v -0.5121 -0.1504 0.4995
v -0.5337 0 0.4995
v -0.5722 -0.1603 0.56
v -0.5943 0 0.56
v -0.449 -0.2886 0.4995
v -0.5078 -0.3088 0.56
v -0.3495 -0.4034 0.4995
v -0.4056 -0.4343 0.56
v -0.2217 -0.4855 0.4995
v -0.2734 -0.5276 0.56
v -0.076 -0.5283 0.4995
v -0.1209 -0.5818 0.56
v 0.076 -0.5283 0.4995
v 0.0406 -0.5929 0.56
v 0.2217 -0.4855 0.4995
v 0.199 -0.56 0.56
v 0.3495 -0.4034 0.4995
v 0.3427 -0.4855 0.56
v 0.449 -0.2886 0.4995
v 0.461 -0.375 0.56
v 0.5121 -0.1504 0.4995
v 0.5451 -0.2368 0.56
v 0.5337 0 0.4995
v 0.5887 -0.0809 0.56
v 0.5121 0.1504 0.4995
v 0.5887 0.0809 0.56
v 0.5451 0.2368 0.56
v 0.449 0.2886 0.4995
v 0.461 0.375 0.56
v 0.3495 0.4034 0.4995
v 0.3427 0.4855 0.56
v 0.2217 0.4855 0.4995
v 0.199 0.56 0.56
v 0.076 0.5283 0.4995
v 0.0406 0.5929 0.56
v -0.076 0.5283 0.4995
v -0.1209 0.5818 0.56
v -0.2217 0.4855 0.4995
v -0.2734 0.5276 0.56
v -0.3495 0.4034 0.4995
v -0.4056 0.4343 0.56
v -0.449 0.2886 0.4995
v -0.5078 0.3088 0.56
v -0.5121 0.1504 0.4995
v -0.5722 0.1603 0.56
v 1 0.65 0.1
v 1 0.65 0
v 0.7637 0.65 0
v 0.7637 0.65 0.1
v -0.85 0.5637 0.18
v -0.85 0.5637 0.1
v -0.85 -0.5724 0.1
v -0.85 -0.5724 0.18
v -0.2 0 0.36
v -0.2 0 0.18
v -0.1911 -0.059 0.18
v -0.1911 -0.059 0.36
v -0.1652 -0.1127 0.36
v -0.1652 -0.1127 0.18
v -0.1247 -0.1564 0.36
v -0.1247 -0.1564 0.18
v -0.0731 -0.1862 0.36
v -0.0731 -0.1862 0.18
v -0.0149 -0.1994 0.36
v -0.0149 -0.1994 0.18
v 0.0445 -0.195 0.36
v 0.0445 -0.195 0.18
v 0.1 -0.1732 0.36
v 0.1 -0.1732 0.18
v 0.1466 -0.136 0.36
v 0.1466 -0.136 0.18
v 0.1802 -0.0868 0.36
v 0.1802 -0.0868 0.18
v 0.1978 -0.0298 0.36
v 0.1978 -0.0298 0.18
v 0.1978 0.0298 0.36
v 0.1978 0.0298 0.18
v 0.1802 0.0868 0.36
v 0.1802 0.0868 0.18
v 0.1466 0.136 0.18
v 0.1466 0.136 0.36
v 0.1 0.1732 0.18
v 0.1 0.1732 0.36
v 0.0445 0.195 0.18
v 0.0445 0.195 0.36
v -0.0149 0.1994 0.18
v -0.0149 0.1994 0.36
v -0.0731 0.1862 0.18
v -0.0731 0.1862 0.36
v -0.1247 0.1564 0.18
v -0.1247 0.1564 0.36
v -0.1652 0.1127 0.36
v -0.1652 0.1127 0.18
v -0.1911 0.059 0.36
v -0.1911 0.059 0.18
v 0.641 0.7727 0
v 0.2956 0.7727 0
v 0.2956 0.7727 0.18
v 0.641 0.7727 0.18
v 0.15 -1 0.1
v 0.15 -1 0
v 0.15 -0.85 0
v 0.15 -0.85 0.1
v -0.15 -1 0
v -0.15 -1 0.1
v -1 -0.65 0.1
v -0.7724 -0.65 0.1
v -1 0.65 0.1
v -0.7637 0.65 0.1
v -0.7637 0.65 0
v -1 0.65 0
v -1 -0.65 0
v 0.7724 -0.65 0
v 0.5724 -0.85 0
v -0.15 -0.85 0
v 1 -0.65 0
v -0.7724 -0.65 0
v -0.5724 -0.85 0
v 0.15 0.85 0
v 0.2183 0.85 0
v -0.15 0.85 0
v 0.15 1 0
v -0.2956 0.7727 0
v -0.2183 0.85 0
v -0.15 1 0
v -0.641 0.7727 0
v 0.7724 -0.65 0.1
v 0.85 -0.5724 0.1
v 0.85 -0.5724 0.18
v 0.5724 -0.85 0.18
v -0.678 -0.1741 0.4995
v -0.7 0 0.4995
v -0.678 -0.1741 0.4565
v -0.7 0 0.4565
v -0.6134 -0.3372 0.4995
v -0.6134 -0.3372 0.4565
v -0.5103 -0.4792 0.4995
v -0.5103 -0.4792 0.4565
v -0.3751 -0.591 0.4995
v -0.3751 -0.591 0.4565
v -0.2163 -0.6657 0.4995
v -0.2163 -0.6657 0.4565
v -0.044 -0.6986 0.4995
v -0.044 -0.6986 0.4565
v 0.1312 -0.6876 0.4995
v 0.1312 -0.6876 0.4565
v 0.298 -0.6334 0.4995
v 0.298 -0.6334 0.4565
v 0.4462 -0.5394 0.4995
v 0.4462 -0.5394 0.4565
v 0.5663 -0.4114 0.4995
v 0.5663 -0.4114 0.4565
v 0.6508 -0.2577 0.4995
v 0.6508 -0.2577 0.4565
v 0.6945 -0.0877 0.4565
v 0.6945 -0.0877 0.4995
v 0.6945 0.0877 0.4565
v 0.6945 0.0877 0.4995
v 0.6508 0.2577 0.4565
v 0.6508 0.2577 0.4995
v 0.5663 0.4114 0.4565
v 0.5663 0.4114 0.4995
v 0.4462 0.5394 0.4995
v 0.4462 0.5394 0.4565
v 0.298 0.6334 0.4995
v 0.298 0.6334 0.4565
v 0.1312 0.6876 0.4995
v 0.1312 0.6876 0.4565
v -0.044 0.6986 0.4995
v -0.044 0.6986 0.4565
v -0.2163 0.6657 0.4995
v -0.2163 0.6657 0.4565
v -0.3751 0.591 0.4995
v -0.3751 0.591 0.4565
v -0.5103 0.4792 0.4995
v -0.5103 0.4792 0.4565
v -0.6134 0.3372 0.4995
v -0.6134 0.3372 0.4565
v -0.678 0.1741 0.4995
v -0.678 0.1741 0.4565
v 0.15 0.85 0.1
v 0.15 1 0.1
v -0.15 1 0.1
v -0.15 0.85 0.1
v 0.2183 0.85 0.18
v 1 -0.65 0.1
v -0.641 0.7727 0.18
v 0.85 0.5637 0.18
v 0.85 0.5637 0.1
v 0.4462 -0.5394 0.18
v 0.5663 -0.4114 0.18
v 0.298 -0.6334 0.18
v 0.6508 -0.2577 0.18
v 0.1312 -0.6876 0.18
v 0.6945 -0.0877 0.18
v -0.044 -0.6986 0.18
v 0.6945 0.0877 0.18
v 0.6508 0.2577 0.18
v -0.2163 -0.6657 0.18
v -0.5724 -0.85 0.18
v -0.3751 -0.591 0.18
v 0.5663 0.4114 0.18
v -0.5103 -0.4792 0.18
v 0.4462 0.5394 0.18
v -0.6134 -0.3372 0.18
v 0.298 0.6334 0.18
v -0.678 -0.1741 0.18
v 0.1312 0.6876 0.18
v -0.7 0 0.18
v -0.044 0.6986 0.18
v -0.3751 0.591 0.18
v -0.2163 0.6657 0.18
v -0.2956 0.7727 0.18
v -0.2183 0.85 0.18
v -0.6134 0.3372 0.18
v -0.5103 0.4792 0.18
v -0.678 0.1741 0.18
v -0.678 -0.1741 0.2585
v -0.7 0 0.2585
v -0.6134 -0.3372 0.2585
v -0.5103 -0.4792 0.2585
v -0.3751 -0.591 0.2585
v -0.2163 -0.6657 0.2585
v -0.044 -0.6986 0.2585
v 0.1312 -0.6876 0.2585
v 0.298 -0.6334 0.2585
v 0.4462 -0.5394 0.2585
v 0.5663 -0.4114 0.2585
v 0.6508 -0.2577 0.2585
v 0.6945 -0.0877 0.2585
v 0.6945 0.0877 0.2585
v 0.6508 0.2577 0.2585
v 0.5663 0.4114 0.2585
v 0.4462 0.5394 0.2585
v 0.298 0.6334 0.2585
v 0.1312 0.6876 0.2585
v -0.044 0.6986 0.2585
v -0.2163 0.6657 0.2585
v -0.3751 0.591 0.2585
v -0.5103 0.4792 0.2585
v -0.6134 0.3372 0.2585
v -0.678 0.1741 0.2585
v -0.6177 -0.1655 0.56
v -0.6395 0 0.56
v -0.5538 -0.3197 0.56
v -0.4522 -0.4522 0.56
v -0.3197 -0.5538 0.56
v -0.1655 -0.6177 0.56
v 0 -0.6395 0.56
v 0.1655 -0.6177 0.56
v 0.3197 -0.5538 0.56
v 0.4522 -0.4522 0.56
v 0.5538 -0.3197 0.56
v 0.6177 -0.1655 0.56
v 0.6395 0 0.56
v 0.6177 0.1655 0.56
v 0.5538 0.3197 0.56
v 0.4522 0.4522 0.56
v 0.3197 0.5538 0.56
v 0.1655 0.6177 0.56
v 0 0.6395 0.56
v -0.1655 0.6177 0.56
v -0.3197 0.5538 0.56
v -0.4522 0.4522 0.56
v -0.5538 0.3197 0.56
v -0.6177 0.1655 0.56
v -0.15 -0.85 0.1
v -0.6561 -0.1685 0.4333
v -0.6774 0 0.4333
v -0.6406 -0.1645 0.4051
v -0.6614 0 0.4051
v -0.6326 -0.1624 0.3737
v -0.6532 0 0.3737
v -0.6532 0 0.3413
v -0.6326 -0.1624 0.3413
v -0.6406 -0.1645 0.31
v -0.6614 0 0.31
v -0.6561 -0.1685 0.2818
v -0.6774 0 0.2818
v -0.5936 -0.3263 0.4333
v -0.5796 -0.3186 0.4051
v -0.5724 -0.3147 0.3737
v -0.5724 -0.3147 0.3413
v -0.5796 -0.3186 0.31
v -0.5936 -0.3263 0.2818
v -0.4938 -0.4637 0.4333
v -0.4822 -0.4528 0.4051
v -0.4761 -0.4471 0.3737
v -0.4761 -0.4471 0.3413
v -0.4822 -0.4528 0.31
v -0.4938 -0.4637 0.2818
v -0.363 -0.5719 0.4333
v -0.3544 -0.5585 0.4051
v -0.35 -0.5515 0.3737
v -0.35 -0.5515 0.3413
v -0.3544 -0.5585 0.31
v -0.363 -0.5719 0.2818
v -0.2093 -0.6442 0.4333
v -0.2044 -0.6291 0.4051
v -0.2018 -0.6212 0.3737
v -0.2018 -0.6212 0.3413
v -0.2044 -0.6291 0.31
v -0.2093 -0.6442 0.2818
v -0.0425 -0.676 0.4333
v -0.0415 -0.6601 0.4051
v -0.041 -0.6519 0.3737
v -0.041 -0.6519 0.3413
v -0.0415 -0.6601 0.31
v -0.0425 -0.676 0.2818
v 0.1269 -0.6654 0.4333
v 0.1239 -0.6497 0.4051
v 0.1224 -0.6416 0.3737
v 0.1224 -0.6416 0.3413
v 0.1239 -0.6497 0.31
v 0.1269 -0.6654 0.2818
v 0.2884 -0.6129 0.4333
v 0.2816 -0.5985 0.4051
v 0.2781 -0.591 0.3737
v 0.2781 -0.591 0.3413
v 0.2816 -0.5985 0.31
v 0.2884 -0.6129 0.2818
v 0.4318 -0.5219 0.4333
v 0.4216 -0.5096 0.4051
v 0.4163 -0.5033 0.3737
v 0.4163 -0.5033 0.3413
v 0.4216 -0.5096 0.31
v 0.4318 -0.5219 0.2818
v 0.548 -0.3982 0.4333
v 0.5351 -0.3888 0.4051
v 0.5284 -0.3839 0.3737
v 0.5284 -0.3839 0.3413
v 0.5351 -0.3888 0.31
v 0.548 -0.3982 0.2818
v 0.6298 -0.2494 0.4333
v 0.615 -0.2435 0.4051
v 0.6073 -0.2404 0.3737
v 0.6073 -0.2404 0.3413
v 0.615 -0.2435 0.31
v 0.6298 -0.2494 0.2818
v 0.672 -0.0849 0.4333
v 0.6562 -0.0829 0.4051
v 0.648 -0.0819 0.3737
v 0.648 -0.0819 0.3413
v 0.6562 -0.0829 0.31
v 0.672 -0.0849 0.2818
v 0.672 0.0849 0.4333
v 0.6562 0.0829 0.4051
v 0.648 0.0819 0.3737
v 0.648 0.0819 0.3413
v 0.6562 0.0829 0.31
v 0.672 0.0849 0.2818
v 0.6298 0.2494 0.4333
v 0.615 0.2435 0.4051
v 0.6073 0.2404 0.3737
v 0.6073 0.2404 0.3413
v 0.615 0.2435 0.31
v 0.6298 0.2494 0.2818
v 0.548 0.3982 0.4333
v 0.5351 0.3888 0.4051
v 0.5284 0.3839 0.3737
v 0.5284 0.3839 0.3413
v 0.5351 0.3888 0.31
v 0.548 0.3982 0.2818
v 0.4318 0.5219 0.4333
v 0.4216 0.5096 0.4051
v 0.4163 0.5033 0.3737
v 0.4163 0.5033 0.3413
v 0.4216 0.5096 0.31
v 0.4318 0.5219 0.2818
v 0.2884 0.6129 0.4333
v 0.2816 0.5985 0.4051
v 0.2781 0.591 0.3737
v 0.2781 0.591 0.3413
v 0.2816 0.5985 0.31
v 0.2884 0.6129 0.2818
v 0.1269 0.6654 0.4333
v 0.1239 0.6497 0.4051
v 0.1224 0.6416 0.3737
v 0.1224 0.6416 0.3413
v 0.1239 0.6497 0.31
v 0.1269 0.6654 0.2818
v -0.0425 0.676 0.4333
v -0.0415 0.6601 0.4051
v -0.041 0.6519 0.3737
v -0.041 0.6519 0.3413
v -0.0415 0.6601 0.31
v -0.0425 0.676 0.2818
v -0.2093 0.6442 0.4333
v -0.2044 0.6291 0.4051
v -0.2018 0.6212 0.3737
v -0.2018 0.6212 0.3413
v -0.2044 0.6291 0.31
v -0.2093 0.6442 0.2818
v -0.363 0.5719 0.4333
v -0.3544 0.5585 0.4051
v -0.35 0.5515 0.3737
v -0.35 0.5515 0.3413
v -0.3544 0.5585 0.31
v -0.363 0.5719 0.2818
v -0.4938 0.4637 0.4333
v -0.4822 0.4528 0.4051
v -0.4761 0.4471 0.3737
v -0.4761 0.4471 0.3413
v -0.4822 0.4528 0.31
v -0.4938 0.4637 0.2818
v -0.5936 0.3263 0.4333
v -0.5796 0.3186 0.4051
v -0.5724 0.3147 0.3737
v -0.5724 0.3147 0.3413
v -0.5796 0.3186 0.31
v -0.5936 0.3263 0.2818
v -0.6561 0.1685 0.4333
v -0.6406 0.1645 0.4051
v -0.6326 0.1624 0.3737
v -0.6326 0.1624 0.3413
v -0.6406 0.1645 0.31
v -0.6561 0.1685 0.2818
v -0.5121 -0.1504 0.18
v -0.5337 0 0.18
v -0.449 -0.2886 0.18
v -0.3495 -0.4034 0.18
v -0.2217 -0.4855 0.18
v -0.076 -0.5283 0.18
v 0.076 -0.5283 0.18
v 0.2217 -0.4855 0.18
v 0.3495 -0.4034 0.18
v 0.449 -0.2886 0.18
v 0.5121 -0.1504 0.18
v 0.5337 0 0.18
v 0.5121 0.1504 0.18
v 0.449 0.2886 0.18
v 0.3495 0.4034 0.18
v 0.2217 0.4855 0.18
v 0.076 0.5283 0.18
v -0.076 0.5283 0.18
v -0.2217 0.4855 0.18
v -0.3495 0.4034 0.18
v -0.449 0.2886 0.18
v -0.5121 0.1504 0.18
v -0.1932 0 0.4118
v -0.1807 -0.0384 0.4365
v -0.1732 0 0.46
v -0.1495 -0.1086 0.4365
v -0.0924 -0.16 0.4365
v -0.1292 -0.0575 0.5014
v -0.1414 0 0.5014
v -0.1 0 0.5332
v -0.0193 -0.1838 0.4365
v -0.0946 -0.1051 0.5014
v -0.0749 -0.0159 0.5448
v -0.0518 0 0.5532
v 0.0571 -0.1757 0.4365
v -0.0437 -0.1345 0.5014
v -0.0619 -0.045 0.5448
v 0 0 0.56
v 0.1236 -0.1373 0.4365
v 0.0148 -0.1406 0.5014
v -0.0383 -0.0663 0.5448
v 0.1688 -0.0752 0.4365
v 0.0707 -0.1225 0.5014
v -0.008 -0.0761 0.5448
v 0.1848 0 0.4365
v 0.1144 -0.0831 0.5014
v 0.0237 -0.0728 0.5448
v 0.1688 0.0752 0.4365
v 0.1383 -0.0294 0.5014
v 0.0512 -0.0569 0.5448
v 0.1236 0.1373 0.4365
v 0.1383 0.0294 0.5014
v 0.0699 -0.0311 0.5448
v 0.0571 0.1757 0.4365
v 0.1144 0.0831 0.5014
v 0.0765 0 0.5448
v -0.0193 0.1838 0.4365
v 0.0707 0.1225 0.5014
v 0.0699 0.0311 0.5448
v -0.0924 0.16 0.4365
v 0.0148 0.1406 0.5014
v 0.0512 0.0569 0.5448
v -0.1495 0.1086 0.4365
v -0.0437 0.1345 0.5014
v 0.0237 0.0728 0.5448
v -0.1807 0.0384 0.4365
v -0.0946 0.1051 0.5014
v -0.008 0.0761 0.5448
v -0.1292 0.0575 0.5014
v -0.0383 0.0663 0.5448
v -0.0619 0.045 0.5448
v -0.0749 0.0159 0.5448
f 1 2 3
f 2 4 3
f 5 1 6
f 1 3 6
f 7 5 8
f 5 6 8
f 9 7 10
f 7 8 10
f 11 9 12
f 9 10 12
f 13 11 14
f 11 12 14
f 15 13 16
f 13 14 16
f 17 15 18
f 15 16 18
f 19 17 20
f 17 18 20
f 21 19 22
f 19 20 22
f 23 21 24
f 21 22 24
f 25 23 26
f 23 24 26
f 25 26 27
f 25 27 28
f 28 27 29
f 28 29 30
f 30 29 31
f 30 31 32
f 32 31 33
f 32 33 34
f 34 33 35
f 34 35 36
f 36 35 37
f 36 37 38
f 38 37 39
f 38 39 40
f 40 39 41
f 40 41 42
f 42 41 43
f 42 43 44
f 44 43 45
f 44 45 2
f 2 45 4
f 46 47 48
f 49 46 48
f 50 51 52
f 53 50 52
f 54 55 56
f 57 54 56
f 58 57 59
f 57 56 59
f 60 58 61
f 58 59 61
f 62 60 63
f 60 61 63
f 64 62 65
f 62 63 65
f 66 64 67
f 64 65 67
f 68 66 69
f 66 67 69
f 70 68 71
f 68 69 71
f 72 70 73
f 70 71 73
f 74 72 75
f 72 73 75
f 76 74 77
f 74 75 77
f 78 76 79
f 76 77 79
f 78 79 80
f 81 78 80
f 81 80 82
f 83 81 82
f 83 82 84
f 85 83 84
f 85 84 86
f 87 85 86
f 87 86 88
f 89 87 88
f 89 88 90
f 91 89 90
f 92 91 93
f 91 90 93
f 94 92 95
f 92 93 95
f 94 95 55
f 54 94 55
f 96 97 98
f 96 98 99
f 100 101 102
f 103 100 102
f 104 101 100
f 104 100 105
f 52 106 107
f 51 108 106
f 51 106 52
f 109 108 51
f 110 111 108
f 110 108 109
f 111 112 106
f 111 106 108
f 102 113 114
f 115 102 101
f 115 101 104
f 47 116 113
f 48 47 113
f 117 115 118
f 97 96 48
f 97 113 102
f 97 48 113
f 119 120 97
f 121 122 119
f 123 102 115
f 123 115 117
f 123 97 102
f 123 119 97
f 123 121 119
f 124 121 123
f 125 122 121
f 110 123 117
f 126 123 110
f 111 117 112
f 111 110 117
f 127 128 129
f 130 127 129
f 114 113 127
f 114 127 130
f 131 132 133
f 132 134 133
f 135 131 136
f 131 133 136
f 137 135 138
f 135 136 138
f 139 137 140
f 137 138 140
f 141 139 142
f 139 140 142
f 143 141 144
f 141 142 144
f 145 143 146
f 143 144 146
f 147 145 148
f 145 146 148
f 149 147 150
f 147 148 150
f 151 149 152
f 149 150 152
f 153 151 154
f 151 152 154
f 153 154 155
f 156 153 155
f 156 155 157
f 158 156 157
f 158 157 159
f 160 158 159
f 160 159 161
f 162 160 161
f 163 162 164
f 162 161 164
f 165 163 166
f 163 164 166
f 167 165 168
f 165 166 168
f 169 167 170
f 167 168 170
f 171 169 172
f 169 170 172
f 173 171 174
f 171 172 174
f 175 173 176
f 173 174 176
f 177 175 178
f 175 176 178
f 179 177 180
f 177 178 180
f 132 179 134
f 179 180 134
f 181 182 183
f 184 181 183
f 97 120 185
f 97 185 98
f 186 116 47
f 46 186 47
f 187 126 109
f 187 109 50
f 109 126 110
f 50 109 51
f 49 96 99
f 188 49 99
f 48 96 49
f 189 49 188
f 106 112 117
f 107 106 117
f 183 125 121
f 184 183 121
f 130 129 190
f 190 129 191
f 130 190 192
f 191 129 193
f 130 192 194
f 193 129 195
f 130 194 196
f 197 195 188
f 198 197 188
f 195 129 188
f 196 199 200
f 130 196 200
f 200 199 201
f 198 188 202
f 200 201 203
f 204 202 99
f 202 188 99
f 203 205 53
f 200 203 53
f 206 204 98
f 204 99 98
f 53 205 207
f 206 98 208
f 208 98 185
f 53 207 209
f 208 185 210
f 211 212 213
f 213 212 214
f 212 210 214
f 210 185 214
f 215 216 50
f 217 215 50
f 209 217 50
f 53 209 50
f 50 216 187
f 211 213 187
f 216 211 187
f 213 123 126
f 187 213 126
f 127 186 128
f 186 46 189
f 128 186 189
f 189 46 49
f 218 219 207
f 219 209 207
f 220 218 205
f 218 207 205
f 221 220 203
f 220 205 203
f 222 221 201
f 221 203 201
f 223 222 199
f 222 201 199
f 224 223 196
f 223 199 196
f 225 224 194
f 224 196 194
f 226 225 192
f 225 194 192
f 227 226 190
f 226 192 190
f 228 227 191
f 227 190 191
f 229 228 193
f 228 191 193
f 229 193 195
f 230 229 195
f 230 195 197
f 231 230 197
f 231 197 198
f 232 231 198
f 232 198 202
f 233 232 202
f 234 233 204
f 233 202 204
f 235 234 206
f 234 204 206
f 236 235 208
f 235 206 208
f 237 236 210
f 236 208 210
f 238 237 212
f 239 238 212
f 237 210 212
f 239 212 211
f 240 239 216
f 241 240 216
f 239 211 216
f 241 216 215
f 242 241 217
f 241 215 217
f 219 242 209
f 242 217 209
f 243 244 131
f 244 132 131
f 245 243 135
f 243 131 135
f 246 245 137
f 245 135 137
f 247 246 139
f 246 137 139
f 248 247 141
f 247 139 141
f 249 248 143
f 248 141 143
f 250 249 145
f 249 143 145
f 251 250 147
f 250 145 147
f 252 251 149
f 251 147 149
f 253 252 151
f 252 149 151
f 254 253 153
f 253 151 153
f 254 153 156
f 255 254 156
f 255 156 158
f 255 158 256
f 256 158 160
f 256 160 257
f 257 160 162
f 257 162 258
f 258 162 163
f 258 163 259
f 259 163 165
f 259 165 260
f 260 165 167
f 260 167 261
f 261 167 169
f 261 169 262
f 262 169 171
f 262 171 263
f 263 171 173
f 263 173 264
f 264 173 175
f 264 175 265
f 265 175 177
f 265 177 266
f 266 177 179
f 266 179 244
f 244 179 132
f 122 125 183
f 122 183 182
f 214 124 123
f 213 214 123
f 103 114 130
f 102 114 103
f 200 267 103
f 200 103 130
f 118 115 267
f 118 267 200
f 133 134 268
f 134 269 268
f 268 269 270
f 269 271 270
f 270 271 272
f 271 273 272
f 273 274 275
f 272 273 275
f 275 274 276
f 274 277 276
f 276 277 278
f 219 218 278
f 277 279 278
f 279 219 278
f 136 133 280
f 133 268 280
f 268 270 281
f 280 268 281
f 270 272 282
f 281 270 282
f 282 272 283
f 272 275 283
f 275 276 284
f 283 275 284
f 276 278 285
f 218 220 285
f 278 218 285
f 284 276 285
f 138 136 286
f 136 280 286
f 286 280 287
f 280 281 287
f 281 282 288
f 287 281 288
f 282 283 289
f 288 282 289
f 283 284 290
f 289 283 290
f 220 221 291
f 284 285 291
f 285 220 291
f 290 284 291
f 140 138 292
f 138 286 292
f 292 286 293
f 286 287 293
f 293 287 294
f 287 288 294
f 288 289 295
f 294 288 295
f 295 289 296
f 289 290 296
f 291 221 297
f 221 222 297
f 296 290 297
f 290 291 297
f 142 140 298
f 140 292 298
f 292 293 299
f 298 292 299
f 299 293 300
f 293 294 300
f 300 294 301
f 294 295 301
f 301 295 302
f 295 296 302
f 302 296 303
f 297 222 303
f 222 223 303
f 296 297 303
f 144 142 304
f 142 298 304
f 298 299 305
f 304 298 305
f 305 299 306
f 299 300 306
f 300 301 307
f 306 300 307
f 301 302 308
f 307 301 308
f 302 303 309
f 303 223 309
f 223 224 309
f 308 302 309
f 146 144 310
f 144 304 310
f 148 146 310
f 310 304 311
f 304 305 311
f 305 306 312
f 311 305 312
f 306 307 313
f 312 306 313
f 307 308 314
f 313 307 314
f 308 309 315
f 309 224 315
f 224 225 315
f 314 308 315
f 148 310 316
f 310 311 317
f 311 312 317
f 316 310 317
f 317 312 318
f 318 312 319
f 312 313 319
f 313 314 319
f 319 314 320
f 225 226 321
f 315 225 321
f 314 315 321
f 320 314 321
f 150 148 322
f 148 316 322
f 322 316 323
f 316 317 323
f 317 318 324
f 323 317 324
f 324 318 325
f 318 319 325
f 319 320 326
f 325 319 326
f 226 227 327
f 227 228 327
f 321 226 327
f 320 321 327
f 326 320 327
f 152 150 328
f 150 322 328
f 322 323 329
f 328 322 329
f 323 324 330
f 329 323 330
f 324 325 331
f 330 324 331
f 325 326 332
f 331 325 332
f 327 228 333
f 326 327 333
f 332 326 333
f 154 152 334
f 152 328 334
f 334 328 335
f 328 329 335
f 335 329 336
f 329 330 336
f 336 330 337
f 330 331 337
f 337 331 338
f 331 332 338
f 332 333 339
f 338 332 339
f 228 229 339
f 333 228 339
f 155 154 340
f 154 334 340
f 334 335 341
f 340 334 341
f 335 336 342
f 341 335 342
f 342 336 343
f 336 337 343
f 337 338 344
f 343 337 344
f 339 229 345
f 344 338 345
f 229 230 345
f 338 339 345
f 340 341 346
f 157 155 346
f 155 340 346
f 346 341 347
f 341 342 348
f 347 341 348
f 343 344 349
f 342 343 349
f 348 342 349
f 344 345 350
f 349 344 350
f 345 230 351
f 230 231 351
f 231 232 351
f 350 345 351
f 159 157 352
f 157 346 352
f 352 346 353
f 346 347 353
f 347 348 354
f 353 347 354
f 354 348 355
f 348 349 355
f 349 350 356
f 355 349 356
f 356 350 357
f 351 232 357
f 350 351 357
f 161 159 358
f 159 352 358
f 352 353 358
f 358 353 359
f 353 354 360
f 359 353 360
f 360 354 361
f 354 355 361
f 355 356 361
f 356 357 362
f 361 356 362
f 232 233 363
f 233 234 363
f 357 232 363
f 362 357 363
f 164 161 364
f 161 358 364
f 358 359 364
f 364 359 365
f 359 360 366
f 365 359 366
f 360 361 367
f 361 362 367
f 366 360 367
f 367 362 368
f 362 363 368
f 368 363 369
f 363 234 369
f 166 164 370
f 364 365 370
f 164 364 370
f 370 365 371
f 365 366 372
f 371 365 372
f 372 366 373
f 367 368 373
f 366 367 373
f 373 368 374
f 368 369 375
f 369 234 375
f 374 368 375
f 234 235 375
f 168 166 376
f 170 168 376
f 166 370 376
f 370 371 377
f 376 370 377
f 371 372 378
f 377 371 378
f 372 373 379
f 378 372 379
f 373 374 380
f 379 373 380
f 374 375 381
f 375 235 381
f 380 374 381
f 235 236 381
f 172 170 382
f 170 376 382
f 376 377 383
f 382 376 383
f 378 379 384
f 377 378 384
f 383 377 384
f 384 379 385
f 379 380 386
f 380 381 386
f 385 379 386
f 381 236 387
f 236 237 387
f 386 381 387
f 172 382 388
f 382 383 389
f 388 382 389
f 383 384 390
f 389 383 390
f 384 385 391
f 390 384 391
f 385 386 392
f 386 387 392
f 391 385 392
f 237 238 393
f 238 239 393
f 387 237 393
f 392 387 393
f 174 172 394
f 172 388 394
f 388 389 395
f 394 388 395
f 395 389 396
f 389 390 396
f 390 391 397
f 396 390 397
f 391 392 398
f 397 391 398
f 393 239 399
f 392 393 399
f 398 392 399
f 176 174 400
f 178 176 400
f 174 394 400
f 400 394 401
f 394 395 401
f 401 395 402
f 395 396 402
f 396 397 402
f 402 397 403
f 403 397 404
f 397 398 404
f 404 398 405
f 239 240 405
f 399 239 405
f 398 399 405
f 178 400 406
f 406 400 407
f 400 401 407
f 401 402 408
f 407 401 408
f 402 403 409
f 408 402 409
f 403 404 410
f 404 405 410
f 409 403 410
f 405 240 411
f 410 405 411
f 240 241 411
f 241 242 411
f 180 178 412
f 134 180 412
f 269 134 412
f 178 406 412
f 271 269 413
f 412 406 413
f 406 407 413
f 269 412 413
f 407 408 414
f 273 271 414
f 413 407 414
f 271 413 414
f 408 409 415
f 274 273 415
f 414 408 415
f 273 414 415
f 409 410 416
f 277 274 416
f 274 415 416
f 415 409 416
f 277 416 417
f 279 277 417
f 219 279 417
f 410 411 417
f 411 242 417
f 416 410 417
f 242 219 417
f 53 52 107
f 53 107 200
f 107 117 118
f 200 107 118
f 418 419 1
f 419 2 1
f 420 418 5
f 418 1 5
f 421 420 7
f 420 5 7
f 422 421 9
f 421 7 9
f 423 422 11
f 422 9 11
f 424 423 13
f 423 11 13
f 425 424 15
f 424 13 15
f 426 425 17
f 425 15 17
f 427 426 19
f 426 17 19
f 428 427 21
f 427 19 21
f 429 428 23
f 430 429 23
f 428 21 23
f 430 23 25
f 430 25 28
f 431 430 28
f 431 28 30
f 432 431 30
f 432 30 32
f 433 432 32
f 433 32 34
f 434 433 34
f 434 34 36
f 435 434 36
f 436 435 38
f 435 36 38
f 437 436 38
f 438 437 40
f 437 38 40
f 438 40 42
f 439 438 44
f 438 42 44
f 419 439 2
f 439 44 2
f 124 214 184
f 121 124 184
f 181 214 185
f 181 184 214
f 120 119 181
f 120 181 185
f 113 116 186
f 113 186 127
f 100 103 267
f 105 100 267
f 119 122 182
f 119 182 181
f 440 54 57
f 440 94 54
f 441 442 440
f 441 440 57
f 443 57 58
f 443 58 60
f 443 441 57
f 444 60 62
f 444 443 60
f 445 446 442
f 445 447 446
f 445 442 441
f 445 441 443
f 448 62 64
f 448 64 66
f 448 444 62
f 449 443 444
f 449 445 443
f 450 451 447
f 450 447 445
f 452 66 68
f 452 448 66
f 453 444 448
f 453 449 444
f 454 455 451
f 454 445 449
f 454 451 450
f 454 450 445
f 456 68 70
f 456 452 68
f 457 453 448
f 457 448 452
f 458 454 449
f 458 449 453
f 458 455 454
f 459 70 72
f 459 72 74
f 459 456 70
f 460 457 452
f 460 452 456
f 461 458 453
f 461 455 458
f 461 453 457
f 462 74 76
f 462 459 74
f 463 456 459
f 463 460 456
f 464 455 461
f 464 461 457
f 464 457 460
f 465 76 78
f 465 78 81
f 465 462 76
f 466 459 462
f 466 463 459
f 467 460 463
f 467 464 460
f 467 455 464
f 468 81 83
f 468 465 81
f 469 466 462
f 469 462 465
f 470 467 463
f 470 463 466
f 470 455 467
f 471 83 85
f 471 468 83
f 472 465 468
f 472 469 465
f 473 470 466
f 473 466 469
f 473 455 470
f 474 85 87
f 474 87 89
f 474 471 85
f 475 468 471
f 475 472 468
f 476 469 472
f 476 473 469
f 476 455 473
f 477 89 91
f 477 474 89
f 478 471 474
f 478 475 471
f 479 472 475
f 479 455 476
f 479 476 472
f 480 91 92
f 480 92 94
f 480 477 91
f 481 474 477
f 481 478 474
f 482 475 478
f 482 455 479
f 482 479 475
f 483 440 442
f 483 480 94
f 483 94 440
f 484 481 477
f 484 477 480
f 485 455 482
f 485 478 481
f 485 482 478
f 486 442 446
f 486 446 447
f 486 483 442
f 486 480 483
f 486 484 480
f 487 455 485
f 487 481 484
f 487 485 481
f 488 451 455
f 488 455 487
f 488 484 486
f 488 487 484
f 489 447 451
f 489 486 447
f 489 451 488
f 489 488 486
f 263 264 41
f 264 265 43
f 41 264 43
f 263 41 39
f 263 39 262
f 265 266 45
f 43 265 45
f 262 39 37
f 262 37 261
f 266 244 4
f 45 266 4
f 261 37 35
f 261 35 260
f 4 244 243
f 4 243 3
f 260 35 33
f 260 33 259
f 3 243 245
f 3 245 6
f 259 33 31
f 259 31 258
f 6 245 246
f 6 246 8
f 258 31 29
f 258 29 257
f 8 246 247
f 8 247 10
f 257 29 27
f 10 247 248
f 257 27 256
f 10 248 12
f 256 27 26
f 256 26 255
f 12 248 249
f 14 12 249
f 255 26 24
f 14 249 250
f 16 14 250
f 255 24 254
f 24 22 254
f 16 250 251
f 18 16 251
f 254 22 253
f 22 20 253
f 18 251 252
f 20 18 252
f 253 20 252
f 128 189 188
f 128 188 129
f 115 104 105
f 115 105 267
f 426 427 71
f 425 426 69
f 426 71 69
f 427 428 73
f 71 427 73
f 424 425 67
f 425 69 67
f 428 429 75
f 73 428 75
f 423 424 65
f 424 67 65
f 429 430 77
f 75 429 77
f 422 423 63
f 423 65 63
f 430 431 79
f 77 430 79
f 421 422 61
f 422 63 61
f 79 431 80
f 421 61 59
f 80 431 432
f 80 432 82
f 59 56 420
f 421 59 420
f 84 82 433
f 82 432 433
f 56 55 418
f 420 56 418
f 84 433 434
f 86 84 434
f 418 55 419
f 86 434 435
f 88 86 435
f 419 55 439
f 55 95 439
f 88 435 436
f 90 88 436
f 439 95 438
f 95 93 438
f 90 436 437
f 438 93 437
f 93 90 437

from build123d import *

# Parameters (mm, degrees)
BOSS_EXTRUDE1_DEPTH   = 0.1
SKETCH1_W             = 0.15
SKETCH1_H             = 0.3
BOSS_EXTRUDE1_2_DEPTH = 0.1
SKETCH1_W_2           = 0.3
SKETCH1_H_2           = 1.3
BOSS_EXTRUDE1_3_DEPTH = 0.1
BOSS_EXTRUDE2_DEPTH   = 0.18
SKETCH3_W             = 0.2
SKETCH3_H             = 0.38
FILLET1_R             = 0.2


with BuildPart() as part:
    # Sketch1 → Boss-Extrude1 (new body)
    with BuildSketch(Plane.XY):
        with BuildLine():
            Line((0, 1), (-0.15, 1))
            Line((-0.15, 1), (-0.15, 0.46269883))
            Line((-0.15, 0.46269883), (-0.075, 0.46269883))
            Line((-0.075, 0.46269883), (-0.075, 0.195574953))
            ThreePointArc((-0.075, 0.195574953), (-0.205961394, -0.038137467), (0, -0.209462556))
            Line((0, -0.209462556), (0, 1))
        make_face()
    boss_extrude1 = extrude(amount=BOSS_EXTRUDE1_DEPTH)



with BuildPart() as body_2:
    # Sketch1 → Boss-Extrude1 2 (new body)
    with BuildSketch(Plane.XY):
        with Locations((-0.075, -0.85)):
            Rectangle(SKETCH1_W, SKETCH1_H)
    boss_extrude1_2 = extrude(amount=BOSS_EXTRUDE1_2_DEPTH)


with BuildPart() as body_3:
    # Sketch1 → Boss-Extrude1 3 (new body)
    with BuildSketch(Plane.XY):
        with Locations((-0.85, 0)):
            Rectangle(SKETCH1_W_2, SKETCH1_H_2)
    boss_extrude1_3 = extrude(amount=BOSS_EXTRUDE1_3_DEPTH)


with BuildPart() as part_1:
    add(part.part)

    add(body_2.part)  # Boss-Extrude2 merges body 2

    add(body_3.part)  # Boss-Extrude2 merges body 3
    # Sketch2 → Boss-Extrude2 (add)
    with BuildSketch(Plane.XY):
        Polygon((0, -0.85), (0, 0.85), (-0.218303033, 0.85), (-0.295625525, 0.772677507), (-0.641012319, 0.772677507), (-0.85, 0.563689826), (-0.85, -0.572384616), (-0.572384616, -0.85), align=None)
    boss_extrude2 = extrude(amount=BOSS_EXTRUDE2_DEPTH)

    # Mirror2: Boss-Extrude1, Boss-Extrude1 2, Boss-Extrude1 3, Boss-Extrude2 across plane
    add(boss_extrude1.mirror(Plane(origin=(0, 0, 0), x_dir=(0, 0, 1), z_dir=(1, 0, 0))))
    add(boss_extrude1_2.mirror(Plane(origin=(0, 0, 0), x_dir=(0, 0, 1), z_dir=(1, 0, 0))))
    add(boss_extrude1_3.mirror(Plane(origin=(0, 0, 0), x_dir=(0, 0, 1), z_dir=(1, 0, 0))))
    add(boss_extrude2.mirror(Plane(origin=(0, 0, 0), x_dir=(0, 0, 1), z_dir=(1, 0, 0))))

    # Sketch3 → Revolve1 (revolve)
    with BuildSketch(Plane(origin=(0, 0, 0), x_dir=(1, 0, 0), z_dir=(0, 1, 0)), mode=Mode.PRIVATE) as revolve1_sk:
        with Locations((0.1, -0.37)):
            Rectangle(SKETCH3_W, SKETCH3_H)
        with BuildLine():
            Line((0.533732411, -0.18), (0.533732411, -0.49946823))
            Line((0.533732411, -0.49946823), (0.594264181, -0.56))
            Line((0.594264181, -0.56), (0.63946823, -0.56))
            Line((0.63946823, -0.56), (0.7, -0.49946823))
            Line((0.7, -0.49946823), (0.7, -0.456485922))
            ThreePointArc((0.7, -0.456485922), (0.652125774, -0.357515968), (0.7, -0.258546013))
            Line((0.7, -0.258546013), (0.7, -0.18))
            Line((0.7, -0.18), (0.533732411, -0.18))
        make_face()
    revolve(revolve1_sk.sketch.rotate(Axis((0, 0, 0.18), (0, 0, 1)), 180), axis=Axis((0, 0, 0.18), (0, 0, 1)))

    # Fillet1
    fillet1_edges = [part_1.edges().sort_by_distance(p)[0] for p in [
        (0.2, 0, 0.56),
    ]]
    fillet(fillet1_edges, radius=FILLET1_R)


solid = part_1.part
